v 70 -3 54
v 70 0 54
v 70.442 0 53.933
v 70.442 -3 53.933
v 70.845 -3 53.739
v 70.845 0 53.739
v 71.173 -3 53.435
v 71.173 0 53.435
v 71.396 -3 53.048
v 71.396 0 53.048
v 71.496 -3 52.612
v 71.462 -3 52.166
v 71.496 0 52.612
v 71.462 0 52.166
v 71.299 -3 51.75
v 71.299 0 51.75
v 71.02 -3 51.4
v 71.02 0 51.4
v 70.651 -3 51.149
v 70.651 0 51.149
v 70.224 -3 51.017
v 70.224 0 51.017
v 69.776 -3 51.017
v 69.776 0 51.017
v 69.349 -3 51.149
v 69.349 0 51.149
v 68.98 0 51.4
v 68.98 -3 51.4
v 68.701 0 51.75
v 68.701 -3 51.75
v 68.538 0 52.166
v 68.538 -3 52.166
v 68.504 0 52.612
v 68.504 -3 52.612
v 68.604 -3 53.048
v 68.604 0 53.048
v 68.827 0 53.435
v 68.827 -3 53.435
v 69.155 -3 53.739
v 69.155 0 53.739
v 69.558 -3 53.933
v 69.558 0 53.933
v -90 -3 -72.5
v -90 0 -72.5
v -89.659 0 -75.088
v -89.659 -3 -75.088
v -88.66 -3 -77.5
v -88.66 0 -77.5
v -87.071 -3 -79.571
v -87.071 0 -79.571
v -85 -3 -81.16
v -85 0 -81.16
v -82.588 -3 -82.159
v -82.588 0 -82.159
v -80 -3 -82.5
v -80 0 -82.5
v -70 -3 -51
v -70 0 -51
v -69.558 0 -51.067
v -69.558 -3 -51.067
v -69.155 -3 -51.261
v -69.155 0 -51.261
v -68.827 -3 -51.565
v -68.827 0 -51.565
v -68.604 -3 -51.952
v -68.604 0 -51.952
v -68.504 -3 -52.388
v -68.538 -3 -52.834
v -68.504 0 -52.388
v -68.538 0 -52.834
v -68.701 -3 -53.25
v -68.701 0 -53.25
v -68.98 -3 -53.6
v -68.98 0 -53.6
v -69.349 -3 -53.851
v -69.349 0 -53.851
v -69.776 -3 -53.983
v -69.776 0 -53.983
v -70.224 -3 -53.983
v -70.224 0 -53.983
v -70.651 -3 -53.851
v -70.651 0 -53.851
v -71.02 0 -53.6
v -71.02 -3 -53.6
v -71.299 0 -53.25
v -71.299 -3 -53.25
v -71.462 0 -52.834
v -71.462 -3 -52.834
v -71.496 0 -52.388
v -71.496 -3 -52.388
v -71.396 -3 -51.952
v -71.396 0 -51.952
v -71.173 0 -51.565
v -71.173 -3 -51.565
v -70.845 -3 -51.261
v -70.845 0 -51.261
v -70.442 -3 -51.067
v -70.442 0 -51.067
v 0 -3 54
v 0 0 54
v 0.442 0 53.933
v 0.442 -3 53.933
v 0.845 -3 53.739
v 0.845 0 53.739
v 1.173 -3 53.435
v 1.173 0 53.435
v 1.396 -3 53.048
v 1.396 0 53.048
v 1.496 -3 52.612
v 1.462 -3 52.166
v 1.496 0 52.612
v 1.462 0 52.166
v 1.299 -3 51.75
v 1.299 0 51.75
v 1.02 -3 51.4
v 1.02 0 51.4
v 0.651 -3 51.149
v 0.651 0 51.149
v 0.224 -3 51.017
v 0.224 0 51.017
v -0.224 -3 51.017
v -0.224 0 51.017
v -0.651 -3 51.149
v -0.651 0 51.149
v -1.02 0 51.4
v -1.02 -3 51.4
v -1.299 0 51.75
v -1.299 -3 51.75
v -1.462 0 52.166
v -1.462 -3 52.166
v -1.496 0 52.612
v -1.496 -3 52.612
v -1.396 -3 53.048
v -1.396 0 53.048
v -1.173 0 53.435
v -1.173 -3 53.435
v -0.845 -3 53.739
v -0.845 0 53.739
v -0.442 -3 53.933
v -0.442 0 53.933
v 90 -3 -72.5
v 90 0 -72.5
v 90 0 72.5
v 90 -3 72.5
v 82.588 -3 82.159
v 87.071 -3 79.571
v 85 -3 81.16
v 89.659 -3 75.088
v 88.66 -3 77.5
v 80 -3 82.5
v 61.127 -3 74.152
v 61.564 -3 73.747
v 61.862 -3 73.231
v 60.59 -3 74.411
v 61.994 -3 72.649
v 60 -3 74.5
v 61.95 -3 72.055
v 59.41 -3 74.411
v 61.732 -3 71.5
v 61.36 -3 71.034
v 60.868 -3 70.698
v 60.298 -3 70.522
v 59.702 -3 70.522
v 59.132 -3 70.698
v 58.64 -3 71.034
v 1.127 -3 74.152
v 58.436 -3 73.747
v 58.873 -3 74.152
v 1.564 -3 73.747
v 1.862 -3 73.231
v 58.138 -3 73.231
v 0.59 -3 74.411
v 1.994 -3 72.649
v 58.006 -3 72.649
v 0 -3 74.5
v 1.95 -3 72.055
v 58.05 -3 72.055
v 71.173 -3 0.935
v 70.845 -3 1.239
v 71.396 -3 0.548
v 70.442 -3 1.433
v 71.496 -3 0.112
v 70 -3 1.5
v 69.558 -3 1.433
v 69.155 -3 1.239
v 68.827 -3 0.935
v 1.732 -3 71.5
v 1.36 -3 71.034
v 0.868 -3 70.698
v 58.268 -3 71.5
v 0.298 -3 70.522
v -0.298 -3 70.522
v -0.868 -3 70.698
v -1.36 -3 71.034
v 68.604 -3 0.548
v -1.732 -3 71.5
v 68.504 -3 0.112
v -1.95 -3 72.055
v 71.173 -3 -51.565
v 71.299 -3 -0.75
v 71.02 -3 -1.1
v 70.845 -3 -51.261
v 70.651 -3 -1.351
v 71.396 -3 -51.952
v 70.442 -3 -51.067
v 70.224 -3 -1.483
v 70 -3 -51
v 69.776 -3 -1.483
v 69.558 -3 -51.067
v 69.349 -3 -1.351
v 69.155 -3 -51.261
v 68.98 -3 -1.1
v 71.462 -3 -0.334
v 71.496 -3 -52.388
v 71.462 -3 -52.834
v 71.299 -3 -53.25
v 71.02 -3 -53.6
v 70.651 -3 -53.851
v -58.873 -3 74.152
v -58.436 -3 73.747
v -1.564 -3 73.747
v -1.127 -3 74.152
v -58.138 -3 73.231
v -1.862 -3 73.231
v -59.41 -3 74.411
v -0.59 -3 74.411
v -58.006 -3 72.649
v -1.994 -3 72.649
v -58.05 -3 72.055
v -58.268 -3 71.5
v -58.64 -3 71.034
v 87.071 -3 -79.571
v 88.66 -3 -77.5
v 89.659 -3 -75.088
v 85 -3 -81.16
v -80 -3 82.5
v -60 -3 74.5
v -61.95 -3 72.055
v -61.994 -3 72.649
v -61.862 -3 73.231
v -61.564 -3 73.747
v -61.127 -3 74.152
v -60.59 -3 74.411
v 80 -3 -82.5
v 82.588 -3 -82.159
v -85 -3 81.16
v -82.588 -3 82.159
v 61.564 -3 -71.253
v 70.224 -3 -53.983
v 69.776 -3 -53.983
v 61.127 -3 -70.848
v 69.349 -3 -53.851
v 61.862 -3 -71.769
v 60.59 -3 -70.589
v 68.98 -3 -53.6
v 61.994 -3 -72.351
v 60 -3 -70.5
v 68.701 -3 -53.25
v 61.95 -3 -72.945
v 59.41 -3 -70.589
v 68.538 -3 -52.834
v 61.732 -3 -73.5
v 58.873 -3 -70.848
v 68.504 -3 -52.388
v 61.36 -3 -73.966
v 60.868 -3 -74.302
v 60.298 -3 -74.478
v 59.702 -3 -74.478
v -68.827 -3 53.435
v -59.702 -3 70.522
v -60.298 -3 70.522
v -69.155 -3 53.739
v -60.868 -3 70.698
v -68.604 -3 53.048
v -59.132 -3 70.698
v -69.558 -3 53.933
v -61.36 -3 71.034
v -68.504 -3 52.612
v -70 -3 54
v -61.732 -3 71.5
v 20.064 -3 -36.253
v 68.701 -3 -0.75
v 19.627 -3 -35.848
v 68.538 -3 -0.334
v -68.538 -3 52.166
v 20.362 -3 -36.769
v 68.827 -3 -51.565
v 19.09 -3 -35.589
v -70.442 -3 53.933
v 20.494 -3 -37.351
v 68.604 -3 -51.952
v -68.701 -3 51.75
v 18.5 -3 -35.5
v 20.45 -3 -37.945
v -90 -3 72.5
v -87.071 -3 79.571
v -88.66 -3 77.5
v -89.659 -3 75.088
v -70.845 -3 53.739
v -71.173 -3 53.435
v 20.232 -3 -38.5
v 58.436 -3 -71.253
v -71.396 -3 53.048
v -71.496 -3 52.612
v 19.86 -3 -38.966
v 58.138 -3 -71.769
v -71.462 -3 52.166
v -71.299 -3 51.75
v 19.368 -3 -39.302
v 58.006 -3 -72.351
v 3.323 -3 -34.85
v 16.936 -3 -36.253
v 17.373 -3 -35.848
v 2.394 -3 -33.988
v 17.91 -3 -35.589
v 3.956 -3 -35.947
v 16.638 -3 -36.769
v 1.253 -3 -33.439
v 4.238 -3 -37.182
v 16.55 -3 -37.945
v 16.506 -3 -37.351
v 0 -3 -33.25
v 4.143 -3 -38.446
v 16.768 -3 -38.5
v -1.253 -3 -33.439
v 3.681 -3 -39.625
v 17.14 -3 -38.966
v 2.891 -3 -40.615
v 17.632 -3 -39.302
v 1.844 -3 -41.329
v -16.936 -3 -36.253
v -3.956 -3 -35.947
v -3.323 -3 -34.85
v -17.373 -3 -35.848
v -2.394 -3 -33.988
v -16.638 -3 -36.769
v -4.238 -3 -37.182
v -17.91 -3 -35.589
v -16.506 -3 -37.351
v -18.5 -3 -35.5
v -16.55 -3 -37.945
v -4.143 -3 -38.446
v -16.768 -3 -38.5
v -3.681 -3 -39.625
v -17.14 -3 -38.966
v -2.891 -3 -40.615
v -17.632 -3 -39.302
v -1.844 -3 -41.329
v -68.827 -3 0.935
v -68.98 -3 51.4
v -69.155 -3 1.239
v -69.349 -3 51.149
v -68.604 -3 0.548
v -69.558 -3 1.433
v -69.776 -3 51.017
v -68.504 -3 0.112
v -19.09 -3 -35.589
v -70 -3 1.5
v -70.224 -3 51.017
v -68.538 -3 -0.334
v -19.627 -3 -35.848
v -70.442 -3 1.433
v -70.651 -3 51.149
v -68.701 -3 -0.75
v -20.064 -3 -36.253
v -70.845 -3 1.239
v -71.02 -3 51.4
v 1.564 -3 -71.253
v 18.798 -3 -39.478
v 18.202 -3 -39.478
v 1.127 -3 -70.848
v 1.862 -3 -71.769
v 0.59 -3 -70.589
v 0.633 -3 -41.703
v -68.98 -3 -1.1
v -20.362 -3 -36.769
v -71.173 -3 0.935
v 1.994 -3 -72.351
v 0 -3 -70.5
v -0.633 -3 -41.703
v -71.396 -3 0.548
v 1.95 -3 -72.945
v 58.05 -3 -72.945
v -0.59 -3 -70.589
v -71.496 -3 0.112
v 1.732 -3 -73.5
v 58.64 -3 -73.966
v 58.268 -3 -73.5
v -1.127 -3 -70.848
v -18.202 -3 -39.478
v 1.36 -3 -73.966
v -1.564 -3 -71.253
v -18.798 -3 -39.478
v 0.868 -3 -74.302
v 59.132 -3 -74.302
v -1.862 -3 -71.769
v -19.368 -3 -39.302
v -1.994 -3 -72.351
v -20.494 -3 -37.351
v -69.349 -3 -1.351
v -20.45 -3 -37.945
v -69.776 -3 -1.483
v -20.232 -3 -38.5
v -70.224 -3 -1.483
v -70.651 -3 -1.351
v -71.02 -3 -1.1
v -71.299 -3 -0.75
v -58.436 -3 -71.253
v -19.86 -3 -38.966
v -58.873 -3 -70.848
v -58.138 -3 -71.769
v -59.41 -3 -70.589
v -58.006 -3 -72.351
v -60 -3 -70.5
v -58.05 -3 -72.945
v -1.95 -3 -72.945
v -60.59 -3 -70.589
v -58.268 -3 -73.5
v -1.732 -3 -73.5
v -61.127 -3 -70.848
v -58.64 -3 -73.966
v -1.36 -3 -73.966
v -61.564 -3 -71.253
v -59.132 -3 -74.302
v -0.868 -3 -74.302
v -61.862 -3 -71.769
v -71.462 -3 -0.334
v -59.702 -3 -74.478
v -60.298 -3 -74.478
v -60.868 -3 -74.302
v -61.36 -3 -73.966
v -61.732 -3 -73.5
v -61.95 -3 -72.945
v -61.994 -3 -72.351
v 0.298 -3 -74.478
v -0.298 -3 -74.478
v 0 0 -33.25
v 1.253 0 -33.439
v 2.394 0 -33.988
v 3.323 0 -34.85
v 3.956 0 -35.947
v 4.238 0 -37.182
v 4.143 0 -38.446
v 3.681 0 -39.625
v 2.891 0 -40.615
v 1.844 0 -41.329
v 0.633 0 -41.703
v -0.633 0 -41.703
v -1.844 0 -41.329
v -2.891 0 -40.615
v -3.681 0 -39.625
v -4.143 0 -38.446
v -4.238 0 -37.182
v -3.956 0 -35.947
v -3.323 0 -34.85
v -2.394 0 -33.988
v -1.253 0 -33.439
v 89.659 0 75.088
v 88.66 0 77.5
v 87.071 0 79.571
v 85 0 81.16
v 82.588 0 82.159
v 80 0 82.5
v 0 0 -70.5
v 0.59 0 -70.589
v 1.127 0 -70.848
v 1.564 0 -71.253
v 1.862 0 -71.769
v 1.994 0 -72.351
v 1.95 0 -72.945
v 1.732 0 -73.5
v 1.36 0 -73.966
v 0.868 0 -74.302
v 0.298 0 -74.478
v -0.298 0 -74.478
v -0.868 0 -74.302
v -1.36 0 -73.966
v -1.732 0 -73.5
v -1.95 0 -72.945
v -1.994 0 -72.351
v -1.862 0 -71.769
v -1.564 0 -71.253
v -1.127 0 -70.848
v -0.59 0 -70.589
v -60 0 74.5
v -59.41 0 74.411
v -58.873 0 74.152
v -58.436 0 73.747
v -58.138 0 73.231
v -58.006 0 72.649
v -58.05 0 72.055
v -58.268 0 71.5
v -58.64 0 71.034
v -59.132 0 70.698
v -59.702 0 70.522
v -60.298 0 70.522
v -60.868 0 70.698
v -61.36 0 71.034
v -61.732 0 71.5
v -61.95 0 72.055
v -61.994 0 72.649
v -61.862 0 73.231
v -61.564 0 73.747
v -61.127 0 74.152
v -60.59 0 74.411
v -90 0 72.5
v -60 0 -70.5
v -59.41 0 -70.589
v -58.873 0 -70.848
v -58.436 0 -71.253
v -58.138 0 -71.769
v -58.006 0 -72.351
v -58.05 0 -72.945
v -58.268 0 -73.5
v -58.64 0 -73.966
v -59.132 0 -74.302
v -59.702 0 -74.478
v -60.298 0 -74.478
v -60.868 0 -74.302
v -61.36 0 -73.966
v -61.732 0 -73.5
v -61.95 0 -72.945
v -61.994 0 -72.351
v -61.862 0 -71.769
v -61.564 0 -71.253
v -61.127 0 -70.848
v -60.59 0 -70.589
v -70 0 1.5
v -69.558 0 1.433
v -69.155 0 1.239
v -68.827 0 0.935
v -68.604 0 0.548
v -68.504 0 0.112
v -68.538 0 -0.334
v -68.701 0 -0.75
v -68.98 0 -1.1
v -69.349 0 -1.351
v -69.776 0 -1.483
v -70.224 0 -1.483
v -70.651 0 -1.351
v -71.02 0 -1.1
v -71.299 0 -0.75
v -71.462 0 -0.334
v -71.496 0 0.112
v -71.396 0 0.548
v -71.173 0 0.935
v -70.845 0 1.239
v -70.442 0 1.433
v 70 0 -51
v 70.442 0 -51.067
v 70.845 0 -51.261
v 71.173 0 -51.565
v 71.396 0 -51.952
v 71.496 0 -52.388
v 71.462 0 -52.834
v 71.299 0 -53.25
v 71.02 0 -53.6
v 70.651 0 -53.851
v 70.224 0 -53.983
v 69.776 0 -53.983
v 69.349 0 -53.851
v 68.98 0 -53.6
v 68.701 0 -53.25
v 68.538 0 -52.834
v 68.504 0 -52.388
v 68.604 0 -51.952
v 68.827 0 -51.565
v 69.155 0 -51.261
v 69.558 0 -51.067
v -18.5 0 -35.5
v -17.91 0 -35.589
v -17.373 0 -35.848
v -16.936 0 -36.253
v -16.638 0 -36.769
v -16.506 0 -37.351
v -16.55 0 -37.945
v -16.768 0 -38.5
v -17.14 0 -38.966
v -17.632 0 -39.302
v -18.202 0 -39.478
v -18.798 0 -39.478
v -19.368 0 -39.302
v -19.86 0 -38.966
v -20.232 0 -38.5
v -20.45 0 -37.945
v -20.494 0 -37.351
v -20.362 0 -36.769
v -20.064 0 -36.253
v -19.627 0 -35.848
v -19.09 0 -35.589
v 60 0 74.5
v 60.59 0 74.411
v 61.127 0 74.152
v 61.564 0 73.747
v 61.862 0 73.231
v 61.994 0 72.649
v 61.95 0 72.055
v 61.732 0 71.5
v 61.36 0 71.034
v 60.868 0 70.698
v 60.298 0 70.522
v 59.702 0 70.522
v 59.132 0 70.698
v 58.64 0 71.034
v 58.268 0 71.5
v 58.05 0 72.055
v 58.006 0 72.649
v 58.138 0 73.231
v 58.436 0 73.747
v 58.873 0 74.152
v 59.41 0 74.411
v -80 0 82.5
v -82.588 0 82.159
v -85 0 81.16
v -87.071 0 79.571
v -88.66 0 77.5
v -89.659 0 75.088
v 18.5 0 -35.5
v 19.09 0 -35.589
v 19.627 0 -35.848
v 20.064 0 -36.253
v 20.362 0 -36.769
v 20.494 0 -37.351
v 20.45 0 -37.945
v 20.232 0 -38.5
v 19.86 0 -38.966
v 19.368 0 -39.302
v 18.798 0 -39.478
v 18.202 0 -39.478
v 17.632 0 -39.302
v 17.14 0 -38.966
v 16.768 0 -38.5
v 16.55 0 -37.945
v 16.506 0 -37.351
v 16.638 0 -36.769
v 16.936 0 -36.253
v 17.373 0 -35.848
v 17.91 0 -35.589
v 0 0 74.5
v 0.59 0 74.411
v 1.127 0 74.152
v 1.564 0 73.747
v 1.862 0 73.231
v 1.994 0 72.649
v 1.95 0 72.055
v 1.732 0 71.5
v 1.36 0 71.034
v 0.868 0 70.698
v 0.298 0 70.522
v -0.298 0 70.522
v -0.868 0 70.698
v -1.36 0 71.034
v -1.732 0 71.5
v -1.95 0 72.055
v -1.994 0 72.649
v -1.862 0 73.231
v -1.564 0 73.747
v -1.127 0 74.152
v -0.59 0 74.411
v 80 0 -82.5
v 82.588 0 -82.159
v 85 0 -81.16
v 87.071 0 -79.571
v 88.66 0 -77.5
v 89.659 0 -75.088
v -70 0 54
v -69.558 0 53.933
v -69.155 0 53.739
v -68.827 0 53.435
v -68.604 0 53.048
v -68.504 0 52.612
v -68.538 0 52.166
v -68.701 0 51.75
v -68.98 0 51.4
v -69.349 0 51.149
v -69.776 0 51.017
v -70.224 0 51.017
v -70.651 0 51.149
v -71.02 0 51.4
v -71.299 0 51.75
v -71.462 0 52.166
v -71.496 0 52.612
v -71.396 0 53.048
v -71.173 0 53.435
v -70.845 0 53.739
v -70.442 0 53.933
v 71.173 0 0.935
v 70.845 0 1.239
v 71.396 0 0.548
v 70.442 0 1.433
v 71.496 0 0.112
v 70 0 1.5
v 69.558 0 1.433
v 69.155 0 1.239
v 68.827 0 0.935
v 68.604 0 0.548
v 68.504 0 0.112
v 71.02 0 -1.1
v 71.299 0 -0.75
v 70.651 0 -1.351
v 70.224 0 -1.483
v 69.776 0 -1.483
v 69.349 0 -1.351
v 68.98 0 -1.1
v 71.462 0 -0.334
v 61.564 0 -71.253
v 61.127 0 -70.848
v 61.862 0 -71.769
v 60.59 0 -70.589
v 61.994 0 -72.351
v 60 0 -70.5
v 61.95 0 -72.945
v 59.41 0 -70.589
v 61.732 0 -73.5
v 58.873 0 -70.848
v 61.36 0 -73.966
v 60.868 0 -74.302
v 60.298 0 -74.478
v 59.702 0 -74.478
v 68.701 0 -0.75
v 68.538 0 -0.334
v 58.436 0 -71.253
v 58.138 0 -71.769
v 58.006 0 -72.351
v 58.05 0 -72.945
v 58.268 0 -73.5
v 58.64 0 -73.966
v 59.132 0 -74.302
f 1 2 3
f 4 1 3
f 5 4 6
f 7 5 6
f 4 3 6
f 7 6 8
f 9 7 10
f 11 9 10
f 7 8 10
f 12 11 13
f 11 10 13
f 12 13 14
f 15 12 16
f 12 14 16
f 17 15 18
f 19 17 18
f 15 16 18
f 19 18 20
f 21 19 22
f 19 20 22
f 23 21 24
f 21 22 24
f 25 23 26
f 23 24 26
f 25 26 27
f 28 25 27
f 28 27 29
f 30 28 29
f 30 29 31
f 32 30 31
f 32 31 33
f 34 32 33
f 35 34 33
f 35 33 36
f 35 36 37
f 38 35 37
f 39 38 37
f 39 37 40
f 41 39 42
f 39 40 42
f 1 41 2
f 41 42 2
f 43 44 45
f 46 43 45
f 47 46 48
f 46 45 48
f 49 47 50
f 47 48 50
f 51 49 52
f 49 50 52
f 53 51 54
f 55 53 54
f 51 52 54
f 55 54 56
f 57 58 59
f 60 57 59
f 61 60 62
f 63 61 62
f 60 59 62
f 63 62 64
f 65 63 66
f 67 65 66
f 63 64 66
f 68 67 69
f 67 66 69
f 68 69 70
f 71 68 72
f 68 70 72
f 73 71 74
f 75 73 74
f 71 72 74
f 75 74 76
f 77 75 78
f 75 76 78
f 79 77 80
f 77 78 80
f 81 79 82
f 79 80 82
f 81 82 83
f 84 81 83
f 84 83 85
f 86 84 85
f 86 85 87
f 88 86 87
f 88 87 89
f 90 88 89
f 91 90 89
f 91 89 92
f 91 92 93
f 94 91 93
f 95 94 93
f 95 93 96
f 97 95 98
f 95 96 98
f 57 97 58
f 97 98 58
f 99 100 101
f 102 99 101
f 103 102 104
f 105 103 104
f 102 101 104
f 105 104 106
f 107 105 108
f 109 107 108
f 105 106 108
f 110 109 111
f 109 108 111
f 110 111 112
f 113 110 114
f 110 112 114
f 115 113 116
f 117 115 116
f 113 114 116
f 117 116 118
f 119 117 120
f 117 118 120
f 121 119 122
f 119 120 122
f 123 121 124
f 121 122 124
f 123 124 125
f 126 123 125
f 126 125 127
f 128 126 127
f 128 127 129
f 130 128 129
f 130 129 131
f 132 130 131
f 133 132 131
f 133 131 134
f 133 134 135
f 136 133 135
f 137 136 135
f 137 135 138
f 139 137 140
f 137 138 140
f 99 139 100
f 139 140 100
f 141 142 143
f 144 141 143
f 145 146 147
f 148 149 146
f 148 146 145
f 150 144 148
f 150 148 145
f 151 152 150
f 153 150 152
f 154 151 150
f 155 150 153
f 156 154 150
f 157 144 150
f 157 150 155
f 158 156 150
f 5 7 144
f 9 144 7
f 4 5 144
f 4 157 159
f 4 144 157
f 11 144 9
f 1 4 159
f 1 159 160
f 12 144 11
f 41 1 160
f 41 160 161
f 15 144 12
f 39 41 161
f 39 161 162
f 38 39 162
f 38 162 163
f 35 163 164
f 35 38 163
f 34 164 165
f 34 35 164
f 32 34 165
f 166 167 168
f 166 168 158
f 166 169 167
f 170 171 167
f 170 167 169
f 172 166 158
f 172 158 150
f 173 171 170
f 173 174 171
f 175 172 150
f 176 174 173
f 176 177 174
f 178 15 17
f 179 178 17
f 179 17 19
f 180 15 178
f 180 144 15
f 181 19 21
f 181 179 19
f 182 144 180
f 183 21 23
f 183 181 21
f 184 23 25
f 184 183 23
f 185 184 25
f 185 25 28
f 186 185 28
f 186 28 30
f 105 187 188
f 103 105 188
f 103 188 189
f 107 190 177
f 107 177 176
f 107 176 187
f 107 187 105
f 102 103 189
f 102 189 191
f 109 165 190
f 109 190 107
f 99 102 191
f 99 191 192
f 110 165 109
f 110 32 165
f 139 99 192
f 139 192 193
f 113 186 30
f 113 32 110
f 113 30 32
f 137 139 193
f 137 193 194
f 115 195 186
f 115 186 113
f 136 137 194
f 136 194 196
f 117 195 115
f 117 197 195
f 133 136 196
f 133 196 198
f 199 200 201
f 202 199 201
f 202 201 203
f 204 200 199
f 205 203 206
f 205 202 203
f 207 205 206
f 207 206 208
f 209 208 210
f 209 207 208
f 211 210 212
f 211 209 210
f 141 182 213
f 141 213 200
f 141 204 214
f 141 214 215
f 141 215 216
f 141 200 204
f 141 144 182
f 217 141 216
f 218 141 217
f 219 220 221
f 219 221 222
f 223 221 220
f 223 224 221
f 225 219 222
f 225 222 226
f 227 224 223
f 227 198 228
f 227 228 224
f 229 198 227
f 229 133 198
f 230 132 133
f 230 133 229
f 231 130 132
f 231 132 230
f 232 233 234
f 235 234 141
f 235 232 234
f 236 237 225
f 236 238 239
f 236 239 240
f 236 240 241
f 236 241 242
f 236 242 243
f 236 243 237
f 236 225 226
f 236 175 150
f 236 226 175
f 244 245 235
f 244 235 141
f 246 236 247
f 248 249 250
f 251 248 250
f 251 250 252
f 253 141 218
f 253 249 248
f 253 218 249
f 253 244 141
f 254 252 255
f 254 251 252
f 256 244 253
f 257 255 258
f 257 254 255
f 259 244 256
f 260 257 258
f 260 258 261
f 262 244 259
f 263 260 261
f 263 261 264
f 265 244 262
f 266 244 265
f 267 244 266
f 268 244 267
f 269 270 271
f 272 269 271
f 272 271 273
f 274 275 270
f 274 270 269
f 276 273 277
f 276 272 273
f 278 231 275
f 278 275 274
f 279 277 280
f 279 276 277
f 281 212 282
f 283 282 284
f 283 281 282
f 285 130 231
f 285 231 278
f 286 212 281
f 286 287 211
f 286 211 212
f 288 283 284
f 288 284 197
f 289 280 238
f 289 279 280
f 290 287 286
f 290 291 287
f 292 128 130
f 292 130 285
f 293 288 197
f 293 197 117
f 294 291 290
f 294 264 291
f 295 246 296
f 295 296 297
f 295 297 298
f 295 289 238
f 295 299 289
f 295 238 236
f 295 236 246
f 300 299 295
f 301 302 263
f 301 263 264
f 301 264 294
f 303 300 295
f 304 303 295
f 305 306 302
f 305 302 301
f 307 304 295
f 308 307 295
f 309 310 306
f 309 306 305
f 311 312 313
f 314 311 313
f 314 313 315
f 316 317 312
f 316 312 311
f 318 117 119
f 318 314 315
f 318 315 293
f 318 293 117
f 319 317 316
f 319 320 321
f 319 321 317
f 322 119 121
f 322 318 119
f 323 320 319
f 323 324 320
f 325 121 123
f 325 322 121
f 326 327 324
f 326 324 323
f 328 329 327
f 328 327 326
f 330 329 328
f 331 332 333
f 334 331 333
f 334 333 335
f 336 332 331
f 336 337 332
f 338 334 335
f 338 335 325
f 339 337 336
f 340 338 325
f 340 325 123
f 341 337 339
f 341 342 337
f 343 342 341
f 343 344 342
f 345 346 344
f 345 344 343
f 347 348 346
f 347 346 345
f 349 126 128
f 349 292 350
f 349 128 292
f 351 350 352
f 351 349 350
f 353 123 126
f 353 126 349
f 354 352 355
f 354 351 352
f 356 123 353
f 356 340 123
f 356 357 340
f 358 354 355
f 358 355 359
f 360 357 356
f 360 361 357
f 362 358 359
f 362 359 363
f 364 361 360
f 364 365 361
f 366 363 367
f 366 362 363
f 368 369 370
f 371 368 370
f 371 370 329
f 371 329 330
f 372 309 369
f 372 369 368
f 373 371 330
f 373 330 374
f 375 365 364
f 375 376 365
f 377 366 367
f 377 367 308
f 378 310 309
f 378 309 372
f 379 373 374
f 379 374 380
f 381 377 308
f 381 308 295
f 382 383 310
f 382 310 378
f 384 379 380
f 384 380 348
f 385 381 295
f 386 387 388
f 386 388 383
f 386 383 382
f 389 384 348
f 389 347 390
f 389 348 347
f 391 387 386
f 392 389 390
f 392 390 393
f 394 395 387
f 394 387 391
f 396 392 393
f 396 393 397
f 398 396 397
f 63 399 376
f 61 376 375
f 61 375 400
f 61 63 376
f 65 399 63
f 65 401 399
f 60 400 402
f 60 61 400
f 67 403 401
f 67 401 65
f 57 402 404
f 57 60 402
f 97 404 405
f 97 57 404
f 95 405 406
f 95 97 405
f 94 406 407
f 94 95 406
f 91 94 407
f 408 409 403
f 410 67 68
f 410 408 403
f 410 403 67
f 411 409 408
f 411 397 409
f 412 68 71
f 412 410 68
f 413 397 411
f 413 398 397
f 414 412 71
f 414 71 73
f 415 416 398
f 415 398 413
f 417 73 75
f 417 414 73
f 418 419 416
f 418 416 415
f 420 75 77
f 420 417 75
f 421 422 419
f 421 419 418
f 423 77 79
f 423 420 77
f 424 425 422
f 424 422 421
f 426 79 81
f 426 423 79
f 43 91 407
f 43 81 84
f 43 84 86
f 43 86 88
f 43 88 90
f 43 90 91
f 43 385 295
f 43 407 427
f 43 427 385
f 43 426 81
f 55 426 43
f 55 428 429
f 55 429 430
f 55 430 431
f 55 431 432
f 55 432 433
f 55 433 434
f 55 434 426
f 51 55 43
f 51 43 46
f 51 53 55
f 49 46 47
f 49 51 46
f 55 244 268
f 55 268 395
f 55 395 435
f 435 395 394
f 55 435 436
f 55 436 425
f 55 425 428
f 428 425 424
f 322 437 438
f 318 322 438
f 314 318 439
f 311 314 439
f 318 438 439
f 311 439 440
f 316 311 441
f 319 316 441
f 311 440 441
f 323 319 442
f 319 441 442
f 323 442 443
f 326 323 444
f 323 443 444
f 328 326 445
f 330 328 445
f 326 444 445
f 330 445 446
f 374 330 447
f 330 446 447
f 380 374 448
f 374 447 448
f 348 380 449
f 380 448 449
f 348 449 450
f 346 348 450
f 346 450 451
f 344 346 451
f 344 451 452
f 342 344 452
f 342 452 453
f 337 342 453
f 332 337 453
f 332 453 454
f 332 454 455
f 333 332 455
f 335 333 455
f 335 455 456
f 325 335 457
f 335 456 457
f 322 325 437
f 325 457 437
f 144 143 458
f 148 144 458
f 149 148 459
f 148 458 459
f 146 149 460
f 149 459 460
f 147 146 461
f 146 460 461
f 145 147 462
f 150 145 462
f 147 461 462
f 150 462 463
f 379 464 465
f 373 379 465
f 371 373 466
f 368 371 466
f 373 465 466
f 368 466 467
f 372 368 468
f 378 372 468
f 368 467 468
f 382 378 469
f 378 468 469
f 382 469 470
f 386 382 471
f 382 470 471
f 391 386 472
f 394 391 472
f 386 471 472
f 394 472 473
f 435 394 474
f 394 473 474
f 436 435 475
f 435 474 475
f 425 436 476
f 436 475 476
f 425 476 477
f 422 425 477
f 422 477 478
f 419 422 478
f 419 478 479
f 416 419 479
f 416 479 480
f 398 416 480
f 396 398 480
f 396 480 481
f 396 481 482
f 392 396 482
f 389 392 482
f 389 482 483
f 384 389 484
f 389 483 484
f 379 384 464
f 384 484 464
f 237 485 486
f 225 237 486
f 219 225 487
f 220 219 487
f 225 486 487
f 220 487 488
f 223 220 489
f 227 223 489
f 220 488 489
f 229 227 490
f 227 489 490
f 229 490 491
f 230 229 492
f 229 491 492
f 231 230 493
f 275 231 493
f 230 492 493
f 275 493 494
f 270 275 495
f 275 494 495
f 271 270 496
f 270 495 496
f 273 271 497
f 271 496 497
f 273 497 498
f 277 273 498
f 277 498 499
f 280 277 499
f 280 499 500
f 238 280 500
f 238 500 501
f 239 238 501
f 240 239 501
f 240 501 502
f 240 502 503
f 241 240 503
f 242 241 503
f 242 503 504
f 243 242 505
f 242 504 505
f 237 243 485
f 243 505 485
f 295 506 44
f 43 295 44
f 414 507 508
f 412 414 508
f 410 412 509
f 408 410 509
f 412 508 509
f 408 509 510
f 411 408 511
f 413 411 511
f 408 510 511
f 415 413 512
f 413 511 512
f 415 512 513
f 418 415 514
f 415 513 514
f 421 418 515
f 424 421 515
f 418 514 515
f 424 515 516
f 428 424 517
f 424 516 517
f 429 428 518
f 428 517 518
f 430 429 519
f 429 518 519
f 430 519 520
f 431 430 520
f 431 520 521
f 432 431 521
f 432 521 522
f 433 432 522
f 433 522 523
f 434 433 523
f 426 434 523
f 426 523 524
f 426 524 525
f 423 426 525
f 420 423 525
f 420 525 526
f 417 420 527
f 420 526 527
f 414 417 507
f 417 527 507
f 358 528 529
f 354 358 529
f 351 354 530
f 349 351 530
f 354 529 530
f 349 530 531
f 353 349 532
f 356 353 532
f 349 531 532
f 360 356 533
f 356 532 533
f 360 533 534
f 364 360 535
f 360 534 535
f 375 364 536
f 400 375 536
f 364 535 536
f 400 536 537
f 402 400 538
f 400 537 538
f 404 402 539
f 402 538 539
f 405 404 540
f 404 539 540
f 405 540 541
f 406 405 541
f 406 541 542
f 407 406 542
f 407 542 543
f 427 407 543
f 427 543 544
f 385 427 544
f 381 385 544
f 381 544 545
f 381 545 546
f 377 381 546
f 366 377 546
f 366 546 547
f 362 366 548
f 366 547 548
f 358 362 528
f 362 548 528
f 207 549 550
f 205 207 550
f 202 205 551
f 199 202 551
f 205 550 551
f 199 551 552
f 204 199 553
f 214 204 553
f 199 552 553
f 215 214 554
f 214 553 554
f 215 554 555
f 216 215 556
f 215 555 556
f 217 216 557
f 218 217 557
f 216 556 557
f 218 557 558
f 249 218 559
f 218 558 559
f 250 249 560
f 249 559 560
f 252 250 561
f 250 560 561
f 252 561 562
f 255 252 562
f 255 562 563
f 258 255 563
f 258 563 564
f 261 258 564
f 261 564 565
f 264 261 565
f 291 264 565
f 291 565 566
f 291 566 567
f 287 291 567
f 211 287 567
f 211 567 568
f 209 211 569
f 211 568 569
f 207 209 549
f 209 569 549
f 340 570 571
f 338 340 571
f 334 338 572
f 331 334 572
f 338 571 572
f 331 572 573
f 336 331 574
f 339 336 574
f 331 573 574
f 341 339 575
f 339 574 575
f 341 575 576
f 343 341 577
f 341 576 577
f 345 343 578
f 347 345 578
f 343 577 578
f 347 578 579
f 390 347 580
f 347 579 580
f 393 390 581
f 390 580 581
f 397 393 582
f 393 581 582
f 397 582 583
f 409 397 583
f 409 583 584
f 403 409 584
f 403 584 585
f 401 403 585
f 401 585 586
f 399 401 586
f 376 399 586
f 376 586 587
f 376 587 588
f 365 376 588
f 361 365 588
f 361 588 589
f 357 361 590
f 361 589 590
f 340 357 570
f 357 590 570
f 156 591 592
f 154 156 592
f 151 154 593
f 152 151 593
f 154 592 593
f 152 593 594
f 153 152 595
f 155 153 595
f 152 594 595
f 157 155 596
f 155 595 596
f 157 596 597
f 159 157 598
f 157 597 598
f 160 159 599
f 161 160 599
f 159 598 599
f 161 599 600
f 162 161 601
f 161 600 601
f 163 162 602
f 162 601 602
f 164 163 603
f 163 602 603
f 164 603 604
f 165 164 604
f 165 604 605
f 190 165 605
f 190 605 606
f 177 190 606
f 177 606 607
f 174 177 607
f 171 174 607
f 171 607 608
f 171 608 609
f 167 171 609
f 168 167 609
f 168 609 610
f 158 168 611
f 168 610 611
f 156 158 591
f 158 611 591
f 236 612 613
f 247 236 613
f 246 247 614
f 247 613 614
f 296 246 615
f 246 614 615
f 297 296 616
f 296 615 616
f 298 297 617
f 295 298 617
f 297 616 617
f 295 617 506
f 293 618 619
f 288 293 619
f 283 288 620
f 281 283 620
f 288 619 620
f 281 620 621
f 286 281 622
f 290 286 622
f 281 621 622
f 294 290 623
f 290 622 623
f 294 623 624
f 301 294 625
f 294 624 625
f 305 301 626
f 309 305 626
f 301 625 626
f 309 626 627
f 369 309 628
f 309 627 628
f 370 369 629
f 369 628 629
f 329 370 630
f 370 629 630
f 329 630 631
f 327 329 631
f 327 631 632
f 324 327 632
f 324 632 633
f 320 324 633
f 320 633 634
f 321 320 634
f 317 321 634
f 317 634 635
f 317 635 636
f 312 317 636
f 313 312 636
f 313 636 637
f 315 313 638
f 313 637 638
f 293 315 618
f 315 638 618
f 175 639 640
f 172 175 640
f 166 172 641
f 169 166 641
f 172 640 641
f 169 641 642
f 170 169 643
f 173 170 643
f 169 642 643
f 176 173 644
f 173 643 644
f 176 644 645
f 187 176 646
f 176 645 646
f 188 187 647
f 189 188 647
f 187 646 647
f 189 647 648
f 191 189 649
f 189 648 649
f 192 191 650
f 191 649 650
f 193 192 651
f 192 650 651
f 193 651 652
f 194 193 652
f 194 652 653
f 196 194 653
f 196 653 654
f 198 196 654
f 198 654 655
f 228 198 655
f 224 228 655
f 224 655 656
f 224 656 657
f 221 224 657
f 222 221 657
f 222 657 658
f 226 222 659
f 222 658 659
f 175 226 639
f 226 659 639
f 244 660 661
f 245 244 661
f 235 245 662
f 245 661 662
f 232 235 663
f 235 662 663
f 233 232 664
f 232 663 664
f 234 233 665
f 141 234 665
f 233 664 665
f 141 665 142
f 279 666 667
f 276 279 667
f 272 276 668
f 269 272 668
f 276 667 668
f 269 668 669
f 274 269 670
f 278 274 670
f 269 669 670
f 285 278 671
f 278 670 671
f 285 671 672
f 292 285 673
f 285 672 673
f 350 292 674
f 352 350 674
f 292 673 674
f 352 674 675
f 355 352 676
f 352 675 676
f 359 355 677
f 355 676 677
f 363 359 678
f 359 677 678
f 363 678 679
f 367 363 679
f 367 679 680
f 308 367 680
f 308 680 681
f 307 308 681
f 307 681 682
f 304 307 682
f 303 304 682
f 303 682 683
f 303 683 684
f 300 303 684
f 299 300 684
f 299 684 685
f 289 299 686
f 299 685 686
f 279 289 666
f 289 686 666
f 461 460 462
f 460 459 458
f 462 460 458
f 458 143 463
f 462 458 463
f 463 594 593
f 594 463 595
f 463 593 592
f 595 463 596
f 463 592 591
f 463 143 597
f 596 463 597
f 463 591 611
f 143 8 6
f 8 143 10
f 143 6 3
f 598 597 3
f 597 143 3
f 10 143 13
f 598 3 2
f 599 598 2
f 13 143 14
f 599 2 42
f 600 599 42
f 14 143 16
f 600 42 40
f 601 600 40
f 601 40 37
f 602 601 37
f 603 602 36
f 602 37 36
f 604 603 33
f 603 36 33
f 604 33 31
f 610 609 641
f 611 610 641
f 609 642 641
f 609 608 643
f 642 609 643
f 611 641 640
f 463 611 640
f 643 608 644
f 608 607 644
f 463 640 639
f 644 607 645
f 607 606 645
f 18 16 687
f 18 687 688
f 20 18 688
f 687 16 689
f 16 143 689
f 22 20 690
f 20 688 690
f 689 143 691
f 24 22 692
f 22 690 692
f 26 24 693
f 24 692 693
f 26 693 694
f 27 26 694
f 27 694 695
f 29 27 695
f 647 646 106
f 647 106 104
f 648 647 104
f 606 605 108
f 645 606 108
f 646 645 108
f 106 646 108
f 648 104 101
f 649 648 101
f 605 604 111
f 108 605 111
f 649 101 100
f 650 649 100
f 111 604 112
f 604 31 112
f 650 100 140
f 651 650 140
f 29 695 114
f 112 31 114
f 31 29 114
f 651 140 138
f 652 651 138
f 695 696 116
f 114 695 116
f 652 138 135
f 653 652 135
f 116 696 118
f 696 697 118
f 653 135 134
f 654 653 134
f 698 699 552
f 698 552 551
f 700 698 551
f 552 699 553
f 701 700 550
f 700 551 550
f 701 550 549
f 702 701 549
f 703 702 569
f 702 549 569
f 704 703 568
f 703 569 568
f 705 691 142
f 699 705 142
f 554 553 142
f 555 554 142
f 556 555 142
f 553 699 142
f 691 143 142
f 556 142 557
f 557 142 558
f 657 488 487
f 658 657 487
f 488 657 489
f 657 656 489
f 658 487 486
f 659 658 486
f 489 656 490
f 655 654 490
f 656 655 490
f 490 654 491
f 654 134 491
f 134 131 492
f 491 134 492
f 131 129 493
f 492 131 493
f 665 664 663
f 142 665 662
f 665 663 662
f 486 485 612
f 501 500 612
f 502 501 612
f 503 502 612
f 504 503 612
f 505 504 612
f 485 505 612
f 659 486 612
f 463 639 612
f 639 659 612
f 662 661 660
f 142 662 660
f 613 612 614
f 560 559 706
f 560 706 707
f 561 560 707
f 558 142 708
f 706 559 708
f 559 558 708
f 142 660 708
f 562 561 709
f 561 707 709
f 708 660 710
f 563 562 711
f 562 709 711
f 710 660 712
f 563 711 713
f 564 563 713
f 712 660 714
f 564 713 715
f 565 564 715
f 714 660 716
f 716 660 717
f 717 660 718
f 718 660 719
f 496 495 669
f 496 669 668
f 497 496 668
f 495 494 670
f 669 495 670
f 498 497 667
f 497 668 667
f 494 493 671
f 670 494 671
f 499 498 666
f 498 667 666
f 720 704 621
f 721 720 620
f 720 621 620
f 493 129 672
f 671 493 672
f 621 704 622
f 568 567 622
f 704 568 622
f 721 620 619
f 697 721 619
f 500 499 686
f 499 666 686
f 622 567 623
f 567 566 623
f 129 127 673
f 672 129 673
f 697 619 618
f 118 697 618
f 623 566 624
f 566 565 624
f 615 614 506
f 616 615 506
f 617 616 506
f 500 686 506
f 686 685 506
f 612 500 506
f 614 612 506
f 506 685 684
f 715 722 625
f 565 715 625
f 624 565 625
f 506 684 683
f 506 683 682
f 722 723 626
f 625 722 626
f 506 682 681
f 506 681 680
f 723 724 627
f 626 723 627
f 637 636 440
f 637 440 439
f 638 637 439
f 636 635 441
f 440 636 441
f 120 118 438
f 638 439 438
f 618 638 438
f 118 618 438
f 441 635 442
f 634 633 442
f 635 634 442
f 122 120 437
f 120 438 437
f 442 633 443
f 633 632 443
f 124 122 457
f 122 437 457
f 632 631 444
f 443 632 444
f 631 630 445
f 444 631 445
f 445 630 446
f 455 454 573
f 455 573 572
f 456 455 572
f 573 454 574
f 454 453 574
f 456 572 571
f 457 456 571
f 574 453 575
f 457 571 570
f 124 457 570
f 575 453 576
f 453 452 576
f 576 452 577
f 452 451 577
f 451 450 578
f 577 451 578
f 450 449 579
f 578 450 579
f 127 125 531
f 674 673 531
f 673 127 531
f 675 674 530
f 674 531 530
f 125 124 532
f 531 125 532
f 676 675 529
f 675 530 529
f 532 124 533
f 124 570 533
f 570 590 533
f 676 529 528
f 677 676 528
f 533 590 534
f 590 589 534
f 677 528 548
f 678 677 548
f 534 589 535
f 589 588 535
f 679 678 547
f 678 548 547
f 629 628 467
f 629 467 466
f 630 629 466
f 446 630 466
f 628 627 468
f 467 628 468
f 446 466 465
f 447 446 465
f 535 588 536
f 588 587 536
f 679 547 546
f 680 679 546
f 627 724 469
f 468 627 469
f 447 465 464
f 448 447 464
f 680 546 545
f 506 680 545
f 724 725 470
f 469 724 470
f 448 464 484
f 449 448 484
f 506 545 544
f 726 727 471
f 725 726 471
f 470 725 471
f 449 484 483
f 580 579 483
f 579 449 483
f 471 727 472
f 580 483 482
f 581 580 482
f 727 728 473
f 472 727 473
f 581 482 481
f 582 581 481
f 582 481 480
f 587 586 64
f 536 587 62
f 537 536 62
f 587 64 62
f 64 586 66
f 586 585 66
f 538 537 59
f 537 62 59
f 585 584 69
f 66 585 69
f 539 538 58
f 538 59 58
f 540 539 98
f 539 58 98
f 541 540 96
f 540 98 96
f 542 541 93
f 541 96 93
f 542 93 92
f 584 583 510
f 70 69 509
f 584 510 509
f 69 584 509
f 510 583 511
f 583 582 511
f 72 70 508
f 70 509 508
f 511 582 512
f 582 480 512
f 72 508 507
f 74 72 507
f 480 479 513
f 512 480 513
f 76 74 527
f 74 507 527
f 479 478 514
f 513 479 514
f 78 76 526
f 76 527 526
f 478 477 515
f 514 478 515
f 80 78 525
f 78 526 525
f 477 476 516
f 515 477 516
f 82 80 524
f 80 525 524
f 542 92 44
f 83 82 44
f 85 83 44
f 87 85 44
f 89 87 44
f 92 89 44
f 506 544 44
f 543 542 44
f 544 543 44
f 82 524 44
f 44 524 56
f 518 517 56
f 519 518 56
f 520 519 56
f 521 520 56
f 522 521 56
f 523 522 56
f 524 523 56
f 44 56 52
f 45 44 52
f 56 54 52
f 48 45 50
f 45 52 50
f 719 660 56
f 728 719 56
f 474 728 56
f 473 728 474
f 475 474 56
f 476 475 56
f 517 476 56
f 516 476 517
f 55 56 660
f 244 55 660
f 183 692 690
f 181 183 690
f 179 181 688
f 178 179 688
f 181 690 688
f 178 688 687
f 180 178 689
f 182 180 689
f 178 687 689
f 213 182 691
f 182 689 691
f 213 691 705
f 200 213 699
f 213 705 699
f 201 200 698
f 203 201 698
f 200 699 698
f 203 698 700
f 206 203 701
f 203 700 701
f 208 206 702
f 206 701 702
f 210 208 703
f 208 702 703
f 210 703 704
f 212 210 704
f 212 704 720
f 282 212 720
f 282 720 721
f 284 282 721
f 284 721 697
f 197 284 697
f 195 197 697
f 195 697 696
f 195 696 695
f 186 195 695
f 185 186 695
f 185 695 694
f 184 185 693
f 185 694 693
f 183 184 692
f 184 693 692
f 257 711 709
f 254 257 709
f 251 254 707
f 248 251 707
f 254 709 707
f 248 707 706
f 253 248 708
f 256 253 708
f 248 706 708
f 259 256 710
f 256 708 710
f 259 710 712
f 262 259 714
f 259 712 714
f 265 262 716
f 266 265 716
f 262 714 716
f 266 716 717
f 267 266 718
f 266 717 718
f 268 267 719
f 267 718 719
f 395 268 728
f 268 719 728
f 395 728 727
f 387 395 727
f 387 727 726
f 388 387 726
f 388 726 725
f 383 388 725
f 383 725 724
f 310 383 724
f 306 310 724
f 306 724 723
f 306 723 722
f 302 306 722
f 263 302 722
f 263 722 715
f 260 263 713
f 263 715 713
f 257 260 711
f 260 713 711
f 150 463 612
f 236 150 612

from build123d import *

# Parameters (mm, degrees)
SKETCH_1_R             = 2
SKETCH_1_R_2           = 4.25
SKETCH_1_R_3           = 1.5
SM_BASE_FLANGE_1_DEPTH = 3


# Sheet-metal steps are written as plain solids
with BuildPart() as part:
    # Sketch 1 → 基体-法兰1 (new body)
    with BuildSketch(Plane(origin=(0, 0, 0), x_dir=(1, 0, 0), z_dir=(0, 1, 0))):
        with BuildLine():
            Line((-80, 82.5), (80, 82.5))
            ThreePointArc((80, 82.5), (87.071067812, 79.571067812), (90, 72.5))
            Line((90, 72.5), (90, -72.5))
            ThreePointArc((90, -72.5), (87.071067812, -79.571067812), (80, -82.5))
            Line((80, -82.5), (-80, -82.5))
            ThreePointArc((-80, -82.5), (-87.071067812, -79.571067812), (-90, -72.5))
            Line((-90, -72.5), (-90, 72.5))
            ThreePointArc((-90, 72.5), (-87.071067812, 79.571067812), (-80, 82.5))
        make_face()
        with Locations(Location((0, 72.5, 0), (0, 0, 270))):
            Circle(SKETCH_1_R, mode=Mode.SUBTRACT)
        with Locations(Location((60, 72.5, 0), (0, 0, 270))):
            Circle(SKETCH_1_R, mode=Mode.SUBTRACT)
        with Locations(Location((-60, 72.5, 0), (0, 0, 270))):
            Circle(SKETCH_1_R, mode=Mode.SUBTRACT)
        with Locations(Location((0, -72.5, 0), (0, 0, 270))):
            Circle(SKETCH_1_R, mode=Mode.SUBTRACT)
        with Locations(Location((-60, -72.5, 0), (0, 0, 270))):
            Circle(SKETCH_1_R, mode=Mode.SUBTRACT)
        with Locations(Location((60, -72.5, 0), (0, 0, 270))):
            Circle(SKETCH_1_R, mode=Mode.SUBTRACT)
        with Locations(Location((0, 37.5, 0), (0, 0, 270))):
            Circle(SKETCH_1_R_2, mode=Mode.SUBTRACT)
        with Locations(Location((18.5, 37.5, 0), (0, 0, 270))):
            Circle(SKETCH_1_R, mode=Mode.SUBTRACT)
        with Locations(Location((-18.5, 37.5, 0), (0, 0, 270))):
            Circle(SKETCH_1_R, mode=Mode.SUBTRACT)
        with Locations(Location((70, 52.5, 0), (0, 0, 270))):
            Circle(SKETCH_1_R_3, mode=Mode.SUBTRACT)
        with Locations(Location((70, 0, 0), (0, 0, 270))):
            Circle(SKETCH_1_R_3, mode=Mode.SUBTRACT)
        with Locations(Location((70, -52.5, 0), (0, 0, 270))):
            Circle(SKETCH_1_R_3, mode=Mode.SUBTRACT)
        with Locations(Location((-70, 52.5, 0), (0, 0, 270))):
            Circle(SKETCH_1_R_3, mode=Mode.SUBTRACT)
        with Locations(Location((-70, 0, 0), (0, 0, 270))):
            Circle(SKETCH_1_R_3, mode=Mode.SUBTRACT)
        with Locations(Location((-70, -52.5, 0), (0, 0, 270))):
            Circle(SKETCH_1_R_3, mode=Mode.SUBTRACT)
        with Locations(Location((0, -52.5, 0), (0, 0, 270))):
            Circle(SKETCH_1_R_3, mode=Mode.SUBTRACT)
    extrude(amount=-SM_BASE_FLANGE_1_DEPTH)


solid = part.part
